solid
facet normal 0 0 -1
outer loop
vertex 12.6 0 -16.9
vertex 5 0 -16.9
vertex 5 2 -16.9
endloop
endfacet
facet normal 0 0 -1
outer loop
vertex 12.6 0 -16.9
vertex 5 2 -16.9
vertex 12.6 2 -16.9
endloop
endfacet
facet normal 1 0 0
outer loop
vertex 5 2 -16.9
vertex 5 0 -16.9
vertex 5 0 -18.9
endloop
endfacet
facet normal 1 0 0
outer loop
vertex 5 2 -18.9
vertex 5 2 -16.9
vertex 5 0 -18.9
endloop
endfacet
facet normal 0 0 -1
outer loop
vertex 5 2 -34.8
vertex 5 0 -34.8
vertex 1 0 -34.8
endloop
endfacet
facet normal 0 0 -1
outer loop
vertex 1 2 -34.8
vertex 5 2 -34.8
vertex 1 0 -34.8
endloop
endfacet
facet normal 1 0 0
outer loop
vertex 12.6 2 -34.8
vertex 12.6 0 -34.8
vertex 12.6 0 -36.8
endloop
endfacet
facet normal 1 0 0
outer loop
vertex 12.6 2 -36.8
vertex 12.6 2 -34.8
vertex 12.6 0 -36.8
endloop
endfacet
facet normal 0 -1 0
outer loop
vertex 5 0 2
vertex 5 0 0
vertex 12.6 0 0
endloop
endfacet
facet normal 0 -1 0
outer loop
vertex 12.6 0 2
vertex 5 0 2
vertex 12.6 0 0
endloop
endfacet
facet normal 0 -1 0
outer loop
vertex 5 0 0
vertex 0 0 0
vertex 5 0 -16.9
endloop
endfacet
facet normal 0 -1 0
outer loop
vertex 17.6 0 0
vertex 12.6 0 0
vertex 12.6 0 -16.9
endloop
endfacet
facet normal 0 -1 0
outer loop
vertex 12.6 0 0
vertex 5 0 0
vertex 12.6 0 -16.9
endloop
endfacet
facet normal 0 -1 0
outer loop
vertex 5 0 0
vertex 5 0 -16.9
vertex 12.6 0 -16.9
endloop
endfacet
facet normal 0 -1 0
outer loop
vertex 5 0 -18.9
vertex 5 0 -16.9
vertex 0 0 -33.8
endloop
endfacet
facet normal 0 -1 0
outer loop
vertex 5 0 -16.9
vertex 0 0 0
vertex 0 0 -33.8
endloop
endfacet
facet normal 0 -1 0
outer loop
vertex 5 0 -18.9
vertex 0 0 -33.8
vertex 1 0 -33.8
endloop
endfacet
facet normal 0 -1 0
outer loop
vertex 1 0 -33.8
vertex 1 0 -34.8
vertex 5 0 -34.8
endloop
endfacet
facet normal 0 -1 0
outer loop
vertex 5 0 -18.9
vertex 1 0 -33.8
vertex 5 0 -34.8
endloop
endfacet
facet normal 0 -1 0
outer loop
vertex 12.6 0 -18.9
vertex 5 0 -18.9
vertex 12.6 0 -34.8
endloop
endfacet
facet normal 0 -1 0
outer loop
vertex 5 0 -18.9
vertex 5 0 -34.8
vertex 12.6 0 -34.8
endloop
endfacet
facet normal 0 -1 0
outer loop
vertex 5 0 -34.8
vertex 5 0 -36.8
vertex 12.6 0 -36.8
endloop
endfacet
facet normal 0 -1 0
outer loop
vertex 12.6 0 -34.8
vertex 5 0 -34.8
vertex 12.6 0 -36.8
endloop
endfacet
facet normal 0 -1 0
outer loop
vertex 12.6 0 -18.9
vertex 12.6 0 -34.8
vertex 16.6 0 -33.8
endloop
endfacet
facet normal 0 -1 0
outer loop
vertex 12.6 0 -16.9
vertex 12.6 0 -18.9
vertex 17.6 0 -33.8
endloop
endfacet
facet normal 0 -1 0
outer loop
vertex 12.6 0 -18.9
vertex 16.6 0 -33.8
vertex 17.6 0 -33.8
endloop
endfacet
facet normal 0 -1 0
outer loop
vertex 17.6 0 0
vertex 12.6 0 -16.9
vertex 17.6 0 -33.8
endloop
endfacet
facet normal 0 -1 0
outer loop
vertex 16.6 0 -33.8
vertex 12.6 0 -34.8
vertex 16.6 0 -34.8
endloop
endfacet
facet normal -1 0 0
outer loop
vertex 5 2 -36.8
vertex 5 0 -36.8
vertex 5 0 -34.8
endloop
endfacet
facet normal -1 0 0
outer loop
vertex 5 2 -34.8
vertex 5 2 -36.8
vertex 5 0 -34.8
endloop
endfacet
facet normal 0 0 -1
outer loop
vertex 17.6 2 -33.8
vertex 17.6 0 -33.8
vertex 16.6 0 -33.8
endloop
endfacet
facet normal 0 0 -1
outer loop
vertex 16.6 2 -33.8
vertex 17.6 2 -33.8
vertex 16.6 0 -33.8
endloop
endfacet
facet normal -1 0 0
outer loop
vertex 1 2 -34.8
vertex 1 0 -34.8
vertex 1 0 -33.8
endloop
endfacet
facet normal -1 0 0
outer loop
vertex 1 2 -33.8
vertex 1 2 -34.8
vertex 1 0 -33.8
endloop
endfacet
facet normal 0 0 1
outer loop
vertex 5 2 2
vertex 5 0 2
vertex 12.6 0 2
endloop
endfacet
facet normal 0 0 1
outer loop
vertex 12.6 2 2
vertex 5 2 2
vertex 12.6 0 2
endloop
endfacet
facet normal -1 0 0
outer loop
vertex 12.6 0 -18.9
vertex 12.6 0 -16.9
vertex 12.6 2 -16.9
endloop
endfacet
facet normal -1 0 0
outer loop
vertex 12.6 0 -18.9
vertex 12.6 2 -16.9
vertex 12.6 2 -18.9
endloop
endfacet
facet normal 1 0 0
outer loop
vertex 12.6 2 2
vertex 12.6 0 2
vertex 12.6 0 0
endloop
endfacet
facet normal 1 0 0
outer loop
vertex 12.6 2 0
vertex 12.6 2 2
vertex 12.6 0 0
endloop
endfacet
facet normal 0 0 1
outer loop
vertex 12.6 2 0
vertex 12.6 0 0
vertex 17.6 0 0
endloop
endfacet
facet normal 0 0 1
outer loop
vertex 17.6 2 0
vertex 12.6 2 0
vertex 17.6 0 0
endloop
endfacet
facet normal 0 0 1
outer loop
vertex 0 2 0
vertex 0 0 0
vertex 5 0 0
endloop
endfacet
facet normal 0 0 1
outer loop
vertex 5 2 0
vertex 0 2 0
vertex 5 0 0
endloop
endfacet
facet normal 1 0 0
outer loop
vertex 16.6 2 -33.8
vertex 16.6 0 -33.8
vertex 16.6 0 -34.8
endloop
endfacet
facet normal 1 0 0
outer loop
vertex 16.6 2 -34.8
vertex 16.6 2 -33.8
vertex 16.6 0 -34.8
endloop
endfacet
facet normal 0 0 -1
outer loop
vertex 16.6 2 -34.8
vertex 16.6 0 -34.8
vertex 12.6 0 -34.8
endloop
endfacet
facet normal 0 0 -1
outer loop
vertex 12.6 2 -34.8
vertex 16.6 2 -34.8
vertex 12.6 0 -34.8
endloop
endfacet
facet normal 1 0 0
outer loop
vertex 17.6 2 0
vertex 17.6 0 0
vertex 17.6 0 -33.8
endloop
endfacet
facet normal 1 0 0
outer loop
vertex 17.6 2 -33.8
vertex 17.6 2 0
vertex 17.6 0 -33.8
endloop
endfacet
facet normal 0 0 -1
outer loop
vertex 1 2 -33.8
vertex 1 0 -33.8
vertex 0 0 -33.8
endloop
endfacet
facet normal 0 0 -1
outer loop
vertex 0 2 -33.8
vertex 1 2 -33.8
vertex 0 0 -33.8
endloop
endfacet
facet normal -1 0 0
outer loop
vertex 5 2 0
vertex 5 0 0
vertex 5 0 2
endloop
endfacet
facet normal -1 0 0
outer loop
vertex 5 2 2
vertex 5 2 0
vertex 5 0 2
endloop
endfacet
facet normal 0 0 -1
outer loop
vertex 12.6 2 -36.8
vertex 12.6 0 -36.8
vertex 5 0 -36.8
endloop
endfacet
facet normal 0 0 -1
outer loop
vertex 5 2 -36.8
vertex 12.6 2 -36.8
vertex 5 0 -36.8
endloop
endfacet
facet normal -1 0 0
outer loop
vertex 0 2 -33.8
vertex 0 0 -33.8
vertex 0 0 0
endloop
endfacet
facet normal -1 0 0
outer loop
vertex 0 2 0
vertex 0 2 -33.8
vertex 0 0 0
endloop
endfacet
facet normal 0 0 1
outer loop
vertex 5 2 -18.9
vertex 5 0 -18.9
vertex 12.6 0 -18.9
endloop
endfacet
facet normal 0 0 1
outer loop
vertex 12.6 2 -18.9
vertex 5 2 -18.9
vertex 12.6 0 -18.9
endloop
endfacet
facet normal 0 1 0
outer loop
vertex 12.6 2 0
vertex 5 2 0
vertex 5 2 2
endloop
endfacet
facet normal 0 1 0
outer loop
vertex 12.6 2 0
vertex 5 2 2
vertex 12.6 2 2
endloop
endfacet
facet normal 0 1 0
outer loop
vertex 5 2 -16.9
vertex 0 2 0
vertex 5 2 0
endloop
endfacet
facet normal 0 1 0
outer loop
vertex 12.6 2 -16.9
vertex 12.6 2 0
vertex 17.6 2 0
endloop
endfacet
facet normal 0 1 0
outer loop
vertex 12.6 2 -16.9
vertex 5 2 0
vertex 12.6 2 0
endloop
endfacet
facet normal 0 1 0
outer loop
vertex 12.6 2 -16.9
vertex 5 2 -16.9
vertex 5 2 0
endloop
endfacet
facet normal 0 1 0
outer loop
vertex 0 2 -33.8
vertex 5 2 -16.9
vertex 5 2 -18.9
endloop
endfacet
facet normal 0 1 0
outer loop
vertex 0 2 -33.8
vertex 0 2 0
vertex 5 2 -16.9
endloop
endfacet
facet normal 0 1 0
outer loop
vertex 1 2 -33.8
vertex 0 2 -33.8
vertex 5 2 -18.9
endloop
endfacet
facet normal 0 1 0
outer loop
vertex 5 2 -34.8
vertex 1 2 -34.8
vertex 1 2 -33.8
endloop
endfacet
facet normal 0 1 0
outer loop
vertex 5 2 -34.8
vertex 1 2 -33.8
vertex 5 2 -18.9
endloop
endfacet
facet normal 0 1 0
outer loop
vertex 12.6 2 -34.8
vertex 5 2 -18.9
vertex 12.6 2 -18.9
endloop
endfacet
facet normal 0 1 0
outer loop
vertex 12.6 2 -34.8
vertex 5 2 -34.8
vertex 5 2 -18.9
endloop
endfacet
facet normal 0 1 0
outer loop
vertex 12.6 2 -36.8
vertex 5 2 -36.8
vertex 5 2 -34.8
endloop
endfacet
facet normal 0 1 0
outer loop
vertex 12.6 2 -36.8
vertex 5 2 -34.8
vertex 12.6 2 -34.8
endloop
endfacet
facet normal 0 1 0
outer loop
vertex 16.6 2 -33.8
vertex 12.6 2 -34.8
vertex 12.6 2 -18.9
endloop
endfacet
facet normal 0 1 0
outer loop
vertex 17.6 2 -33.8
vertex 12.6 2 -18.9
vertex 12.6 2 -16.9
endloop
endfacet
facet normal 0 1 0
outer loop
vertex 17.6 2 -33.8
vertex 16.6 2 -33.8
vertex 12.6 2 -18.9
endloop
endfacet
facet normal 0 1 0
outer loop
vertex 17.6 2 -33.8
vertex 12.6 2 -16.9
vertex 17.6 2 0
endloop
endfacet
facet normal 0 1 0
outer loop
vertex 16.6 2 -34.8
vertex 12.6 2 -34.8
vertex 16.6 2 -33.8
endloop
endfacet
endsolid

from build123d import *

# Parameters (mm, degrees)
SKETCH_1_W      = 7.6
SKETCH_1_H      = 2
EXTRUDE_1_DEPTH = 2


with BuildPart() as part:
    # 草图1 → 凸台-拉伸1 (new body)
    with BuildSketch(Plane(origin=(0, 0, 0), x_dir=(1, 0, 0), z_dir=(0, 1, 0))):
        Polygon((0, 33.8), (0, 0), (5, 0), (5, -2), (12.6, -2), (12.6, 0), (17.6, 0), (17.6, 33.8), (16.6, 33.8), (16.6, 34.8), (12.6, 34.8), (12.6, 36.8), (5, 36.8), (5, 34.8), (1, 34.8), (1, 33.8), align=None)
        with Locations((8.8, 17.9)):
            Rectangle(SKETCH_1_W, SKETCH_1_H, mode=Mode.SUBTRACT)
    extrude(amount=EXTRUDE_1_DEPTH)


solid = part.part
